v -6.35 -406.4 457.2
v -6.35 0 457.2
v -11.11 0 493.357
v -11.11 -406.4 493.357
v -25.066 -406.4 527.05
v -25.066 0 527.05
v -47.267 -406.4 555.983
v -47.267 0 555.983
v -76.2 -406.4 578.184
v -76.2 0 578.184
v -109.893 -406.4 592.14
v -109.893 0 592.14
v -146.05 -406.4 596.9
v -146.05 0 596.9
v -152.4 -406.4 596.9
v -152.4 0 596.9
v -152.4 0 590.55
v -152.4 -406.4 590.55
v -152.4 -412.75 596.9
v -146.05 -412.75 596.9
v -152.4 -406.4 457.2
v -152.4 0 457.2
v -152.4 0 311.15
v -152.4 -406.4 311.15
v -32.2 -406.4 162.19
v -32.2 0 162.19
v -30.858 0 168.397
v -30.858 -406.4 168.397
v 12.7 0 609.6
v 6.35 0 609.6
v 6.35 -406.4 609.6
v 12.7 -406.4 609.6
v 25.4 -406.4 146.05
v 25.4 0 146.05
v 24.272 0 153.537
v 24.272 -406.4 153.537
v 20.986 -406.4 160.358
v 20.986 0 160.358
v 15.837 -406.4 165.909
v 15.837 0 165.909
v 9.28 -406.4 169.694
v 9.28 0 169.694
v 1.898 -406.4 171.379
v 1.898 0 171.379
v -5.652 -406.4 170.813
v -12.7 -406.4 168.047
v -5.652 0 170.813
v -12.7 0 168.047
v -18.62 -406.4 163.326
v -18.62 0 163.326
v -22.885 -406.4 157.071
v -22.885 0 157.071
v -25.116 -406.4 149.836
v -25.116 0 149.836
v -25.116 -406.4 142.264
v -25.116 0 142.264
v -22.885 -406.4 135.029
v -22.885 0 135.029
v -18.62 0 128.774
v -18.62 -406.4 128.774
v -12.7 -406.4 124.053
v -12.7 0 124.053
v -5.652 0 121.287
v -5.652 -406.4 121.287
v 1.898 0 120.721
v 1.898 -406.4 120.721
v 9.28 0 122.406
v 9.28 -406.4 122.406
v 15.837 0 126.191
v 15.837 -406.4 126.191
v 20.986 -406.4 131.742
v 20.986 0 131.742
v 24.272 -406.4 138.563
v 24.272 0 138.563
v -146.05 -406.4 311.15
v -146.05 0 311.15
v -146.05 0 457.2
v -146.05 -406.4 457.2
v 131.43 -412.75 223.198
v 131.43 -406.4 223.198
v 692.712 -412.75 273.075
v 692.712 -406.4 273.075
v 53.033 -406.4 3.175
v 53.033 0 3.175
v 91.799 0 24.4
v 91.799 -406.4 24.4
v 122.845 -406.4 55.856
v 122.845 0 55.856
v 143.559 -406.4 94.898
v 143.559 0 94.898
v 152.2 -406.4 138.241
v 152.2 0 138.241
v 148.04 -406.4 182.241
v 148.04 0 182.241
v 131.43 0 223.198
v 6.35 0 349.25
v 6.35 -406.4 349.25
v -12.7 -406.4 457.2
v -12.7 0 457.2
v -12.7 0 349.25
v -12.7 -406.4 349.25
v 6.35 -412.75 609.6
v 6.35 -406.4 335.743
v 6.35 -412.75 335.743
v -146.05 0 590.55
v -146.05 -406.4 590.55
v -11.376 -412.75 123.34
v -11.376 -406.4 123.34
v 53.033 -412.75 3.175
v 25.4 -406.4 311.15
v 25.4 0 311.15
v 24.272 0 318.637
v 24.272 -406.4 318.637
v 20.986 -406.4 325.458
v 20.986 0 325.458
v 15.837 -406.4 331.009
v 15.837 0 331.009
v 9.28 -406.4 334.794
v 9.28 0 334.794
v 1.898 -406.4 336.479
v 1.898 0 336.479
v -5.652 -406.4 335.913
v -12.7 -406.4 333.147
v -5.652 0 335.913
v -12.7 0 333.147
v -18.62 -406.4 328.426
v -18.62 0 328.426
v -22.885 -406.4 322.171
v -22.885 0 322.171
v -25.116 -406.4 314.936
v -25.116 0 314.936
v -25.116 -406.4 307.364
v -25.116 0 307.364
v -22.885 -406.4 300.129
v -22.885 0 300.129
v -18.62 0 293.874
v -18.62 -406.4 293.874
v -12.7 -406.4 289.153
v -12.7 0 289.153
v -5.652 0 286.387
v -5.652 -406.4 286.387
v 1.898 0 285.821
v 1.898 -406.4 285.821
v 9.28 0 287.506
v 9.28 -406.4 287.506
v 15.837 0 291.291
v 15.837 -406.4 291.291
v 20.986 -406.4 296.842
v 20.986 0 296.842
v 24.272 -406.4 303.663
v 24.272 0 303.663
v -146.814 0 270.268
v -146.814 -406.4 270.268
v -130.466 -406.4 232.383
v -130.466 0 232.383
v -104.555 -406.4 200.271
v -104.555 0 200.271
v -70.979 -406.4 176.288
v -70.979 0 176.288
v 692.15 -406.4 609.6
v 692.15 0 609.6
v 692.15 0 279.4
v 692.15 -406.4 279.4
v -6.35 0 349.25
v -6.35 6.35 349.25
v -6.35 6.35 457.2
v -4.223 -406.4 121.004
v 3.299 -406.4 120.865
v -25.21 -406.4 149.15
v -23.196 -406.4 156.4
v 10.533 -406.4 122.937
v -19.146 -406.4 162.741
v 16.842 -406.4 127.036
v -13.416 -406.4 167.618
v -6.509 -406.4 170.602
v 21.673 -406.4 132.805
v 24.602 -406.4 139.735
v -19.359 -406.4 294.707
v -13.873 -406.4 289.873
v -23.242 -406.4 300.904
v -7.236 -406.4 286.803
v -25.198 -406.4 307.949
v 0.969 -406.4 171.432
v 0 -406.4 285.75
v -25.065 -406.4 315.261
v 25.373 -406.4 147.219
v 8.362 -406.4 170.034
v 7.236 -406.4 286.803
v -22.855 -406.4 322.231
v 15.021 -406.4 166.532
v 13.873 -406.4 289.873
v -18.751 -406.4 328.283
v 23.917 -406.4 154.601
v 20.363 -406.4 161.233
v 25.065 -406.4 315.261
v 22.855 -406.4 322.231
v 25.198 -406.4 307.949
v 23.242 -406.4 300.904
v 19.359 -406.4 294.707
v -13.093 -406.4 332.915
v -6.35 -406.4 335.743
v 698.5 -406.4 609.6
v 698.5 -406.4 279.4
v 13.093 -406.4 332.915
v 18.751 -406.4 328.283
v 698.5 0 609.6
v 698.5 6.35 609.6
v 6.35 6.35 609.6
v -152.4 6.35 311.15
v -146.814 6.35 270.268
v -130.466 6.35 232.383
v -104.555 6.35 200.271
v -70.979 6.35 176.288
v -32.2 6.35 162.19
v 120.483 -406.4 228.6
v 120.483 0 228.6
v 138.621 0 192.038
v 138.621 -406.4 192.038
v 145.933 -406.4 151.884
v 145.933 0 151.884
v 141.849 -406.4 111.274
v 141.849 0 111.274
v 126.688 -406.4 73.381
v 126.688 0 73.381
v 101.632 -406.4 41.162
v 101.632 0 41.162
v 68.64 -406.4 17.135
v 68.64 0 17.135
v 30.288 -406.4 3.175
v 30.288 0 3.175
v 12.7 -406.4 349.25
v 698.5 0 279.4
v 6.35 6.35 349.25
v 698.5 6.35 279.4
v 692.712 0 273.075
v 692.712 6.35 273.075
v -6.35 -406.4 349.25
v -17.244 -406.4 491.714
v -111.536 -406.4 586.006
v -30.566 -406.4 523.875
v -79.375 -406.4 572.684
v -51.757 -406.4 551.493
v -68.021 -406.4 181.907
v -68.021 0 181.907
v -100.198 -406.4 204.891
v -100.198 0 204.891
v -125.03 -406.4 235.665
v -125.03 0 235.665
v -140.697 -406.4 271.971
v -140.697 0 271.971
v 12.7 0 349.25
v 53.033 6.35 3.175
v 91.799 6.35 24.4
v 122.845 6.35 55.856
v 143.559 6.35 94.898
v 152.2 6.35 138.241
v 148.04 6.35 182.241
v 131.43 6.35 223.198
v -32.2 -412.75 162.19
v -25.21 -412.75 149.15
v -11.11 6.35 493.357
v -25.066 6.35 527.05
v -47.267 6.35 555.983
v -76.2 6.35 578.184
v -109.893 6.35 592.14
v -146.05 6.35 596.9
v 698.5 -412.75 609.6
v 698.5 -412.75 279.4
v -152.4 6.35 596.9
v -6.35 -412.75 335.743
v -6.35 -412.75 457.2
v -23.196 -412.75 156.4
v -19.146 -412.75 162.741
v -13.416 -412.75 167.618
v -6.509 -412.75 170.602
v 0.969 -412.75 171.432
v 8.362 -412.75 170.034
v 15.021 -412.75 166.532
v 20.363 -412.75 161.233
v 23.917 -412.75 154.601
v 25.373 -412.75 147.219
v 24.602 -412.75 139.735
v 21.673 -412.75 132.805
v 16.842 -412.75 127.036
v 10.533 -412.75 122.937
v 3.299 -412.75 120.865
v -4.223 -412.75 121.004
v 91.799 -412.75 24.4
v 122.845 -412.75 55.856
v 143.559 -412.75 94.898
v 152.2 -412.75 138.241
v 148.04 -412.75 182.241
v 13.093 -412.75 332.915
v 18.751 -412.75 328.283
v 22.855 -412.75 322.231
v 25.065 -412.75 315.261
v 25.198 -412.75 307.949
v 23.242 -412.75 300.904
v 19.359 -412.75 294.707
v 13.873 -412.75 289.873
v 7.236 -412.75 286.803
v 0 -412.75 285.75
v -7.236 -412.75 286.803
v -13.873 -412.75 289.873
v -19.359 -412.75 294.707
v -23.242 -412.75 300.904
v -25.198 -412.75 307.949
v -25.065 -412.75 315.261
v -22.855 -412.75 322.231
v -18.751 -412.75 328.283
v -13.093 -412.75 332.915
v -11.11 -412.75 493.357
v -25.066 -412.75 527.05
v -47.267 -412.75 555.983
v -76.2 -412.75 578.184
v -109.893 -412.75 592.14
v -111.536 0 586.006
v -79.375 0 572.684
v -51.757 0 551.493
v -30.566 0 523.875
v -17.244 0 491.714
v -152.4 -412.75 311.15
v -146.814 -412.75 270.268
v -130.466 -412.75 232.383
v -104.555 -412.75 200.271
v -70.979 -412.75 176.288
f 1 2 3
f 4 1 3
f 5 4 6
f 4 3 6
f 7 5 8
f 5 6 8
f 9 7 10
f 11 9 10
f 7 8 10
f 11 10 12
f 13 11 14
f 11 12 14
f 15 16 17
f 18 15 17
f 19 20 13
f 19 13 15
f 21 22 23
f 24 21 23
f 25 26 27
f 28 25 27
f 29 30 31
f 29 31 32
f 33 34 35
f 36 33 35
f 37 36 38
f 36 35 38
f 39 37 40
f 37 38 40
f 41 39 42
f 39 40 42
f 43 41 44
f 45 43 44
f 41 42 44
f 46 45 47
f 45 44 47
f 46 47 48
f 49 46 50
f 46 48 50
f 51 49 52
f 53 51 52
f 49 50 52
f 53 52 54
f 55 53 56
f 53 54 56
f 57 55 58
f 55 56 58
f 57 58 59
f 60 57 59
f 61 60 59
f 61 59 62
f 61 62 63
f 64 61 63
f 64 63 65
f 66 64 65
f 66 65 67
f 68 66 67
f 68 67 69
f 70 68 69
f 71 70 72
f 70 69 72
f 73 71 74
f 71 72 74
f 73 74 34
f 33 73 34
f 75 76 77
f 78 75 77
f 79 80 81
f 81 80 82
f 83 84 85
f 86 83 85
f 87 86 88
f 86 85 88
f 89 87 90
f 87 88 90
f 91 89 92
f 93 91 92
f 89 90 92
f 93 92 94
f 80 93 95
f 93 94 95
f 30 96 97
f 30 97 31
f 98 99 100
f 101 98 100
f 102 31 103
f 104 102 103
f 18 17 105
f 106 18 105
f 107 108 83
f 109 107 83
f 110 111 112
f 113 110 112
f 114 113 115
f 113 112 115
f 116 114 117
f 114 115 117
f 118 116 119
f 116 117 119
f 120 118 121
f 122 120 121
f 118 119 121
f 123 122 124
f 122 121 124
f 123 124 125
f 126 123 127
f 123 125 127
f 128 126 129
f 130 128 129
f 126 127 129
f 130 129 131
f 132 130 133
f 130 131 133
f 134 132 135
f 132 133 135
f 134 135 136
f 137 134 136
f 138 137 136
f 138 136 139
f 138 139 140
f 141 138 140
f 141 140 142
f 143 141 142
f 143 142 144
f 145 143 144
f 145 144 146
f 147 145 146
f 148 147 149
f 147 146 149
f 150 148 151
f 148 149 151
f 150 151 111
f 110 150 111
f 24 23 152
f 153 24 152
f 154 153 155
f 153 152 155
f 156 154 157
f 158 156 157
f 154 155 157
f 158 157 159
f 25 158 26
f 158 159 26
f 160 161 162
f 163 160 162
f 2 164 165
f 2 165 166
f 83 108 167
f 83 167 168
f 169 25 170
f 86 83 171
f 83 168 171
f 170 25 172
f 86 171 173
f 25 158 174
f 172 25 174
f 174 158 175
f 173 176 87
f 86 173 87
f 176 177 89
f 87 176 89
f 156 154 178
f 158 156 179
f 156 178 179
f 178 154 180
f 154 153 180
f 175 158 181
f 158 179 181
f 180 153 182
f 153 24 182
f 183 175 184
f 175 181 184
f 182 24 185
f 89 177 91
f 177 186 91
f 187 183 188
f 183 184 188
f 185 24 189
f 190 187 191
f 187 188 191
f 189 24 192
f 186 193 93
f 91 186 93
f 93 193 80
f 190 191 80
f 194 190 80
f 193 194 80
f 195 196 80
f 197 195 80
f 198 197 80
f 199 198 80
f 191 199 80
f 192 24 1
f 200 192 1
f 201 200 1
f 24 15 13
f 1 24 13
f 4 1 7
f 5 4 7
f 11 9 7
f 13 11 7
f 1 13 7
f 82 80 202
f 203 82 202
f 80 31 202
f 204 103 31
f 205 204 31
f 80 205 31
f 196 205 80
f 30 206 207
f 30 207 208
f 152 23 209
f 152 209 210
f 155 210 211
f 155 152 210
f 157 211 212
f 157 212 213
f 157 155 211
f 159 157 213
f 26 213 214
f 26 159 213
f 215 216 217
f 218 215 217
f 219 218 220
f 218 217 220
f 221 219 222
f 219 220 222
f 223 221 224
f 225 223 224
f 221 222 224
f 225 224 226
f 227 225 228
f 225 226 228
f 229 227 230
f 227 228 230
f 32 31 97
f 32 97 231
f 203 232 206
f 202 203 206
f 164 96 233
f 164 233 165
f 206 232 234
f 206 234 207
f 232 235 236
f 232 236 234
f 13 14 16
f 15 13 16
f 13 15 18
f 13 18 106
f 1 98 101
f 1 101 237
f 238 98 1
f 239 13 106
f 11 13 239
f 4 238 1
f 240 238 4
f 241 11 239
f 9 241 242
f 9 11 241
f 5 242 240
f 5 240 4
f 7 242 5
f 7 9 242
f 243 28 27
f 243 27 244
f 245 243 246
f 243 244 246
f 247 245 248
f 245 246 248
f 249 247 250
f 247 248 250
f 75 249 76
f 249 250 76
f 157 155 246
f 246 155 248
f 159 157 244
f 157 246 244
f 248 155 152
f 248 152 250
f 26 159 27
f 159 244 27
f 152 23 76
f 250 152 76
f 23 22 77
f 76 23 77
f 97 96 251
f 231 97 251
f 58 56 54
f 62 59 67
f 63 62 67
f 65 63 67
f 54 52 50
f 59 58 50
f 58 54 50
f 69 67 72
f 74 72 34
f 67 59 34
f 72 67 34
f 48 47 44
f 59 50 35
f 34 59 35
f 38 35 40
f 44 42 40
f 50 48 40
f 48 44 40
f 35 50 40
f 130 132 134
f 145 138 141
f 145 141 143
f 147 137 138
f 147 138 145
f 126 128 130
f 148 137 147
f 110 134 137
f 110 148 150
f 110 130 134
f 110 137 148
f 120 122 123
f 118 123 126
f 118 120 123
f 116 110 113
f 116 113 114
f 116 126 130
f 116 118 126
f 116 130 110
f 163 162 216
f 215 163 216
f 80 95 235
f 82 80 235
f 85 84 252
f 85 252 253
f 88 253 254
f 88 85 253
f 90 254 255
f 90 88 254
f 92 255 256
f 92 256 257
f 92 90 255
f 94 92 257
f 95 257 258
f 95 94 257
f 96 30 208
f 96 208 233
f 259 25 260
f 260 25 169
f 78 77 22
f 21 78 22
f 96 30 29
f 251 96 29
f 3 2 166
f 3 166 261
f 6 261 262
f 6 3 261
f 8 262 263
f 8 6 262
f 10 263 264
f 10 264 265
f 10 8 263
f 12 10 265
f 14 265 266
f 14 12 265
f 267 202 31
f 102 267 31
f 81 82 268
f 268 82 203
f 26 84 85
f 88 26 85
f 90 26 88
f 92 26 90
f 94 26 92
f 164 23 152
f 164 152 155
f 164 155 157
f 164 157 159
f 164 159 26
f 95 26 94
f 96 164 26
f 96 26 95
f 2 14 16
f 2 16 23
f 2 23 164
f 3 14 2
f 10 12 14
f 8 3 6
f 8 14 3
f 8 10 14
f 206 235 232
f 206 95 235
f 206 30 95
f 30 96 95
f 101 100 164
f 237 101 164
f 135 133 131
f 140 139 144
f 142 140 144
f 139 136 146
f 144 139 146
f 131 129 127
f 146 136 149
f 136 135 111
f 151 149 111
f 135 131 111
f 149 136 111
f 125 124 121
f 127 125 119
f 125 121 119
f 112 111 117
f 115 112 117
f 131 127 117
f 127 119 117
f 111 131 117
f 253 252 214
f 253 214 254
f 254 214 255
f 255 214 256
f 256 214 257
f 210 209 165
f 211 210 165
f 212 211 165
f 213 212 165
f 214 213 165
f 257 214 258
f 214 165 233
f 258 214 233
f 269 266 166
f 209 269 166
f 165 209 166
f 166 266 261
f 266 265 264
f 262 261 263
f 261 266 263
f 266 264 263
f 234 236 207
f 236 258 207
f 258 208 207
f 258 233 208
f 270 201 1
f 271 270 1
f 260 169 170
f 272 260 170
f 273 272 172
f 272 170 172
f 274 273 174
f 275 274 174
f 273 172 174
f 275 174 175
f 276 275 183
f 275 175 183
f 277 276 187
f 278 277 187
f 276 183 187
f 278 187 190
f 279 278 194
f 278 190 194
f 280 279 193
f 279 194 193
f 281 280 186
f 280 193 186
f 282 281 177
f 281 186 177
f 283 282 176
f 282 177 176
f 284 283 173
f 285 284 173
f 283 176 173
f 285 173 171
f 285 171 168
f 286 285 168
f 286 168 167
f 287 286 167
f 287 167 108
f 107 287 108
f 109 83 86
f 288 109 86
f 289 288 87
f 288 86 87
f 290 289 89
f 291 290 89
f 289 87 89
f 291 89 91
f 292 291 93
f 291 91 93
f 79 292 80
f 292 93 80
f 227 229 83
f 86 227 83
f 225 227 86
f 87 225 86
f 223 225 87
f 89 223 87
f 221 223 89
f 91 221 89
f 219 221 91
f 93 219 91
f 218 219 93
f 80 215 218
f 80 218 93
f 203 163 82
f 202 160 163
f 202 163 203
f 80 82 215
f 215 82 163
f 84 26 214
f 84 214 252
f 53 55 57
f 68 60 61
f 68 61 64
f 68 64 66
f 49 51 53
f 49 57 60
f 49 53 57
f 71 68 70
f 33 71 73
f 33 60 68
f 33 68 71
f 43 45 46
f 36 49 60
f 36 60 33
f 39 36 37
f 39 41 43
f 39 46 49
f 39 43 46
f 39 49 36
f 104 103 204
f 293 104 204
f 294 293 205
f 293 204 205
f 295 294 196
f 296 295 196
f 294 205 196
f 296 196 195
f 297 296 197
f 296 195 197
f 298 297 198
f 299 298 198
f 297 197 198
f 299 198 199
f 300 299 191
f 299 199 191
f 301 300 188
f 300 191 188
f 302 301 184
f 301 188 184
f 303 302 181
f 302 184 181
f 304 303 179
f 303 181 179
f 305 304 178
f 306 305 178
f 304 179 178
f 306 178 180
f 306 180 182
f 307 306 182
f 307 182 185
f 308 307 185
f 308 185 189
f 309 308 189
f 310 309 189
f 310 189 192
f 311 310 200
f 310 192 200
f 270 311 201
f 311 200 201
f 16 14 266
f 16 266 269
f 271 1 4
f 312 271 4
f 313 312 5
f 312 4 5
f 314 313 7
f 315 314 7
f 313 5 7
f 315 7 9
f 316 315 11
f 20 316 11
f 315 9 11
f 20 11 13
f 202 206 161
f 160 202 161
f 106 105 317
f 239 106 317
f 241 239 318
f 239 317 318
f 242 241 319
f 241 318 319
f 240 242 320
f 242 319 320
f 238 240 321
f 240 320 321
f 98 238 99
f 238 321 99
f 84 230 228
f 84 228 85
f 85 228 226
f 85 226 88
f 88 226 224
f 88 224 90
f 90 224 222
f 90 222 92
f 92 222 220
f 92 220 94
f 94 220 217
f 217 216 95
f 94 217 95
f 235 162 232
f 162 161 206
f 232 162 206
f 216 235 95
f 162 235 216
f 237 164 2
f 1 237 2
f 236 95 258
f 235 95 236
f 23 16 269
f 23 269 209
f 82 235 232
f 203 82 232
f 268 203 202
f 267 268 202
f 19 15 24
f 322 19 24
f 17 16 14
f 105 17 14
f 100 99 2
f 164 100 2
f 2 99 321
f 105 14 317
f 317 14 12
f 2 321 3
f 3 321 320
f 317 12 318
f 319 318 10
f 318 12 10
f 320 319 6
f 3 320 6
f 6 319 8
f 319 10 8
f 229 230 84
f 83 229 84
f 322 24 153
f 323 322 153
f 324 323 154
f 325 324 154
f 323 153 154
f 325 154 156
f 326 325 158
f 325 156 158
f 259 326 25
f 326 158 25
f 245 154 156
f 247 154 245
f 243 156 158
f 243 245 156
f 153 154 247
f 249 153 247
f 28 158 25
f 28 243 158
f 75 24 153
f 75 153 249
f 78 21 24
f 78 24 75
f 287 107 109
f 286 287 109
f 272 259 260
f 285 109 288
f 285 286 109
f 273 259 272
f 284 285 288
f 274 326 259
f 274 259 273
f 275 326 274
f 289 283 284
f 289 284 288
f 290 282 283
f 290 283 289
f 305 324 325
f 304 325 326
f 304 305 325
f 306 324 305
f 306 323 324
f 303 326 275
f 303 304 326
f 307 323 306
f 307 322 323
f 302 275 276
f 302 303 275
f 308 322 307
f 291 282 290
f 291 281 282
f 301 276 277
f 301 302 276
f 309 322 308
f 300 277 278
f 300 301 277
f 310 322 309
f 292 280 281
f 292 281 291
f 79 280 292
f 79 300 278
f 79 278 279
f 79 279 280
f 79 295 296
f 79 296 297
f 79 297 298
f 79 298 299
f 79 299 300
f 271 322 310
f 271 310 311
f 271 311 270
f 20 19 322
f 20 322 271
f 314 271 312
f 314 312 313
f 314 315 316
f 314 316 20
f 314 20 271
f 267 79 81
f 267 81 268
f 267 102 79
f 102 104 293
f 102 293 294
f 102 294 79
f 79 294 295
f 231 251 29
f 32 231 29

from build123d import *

# Parameters (mm, degrees)
F0_R     = 25.4
F1_DEPTH = 406.4
F0_W     = 6.35
F0_H     = 260.35
F3_DEPTH = 6.35
F5_DEPTH = 6.35


# Not quite as in the source:
# - a feature names something its author has since deleted; it is built from what else it names


with BuildPart() as f1:
    # F0 (on Front) → F1 (new body)
    with BuildSketch(Plane.XZ):
        with Locations((0, 146.05)):
            Circle(F0_R)
    extrude(amount=F1_DEPTH)


with BuildPart() as f1b:
    # F0 (on Front) → F1, piece 2 (new body)
    with BuildSketch(Plane.XZ):
        with BuildLine():
            Line((-32.1996567388, 162.1904682274), (-30.8580043747, 168.3971153846))
            ThreePointArc((-30.8580043747, 168.3971153846), (-113.6604901426, 219.4336138929), (-146.05, 311.15))
            Line((-146.05, 311.15), (-146.05, 457.2))
            Line((-146.05, 457.2), (-152.4, 457.2))
            Line((-152.4, 457.2), (-152.4, 311.15))
            ThreePointArc((-152.4, 311.15), (-118.6022505836, 215.4459449318), (-32.1996567388, 162.1904682274))
        make_face()
    extrude(amount=F1_DEPTH)


with BuildPart() as f1c:
    # F0 (on Front) → F1, piece 3 (new body)
    with BuildSketch(Plane.XZ):
        with Locations((0, 311.15)):
            Circle(F0_R)
    extrude(amount=F1_DEPTH)


with BuildPart() as f1d:
    # F0 (on Front) → F1, piece 4 (new body)
    with BuildSketch(Plane.XZ):
        with BuildLine():
            ThreePointArc((120.4827788524, 228.6), (135.5987911183, 91.7953195822), (30.287569645, 3.175))
            Line((30.287569645, 3.175), (53.032955556, 3.175))
            ThreePointArc((53.032955556, 3.175), (143.559051356, 94.8976904357), (131.430489055, 223.1978226963))
            Line((131.430489055, 223.1978226963), (692.7120644971, 273.0749242296))
            Line((692.7120644971, 273.0749242296), (698.5, 279.4))
            Line((698.5, 279.4), (698.5, 609.6))
            Line((698.5, 609.6), (692.15, 609.6))
            Line((692.15, 609.6), (692.15, 279.4))
            Line((692.15, 279.4), (120.4827788524, 228.6))
        make_face()
    extrude(amount=F1_DEPTH)


with BuildPart() as f1e:
    # F0 (on Front) → F1, piece 5 (new body)
    with BuildSketch(Plane.XZ):
        with Locations((9.525, 479.425)):
            Rectangle(F0_W, F0_H)
    extrude(amount=F1_DEPTH)


with BuildPart() as f1f:
    # F0 (on Front) → F1, piece 6 (new body)
    with BuildSketch(Plane.XZ):
        with BuildLine():
            Line((-12.7, 457.2), (-12.7, 349.25))
            Line((-12.7, 349.25), (-6.35, 349.25))
            Line((-6.35, 349.25), (-6.35, 457.2))
            ThreePointArc((-6.35, 457.2), (-47.2671826682, 555.9828173318), (-146.05, 596.9))
            Line((-146.05, 596.9), (-152.4, 596.9))
            Line((-152.4, 596.9), (-152.4, 590.55))
            Line((-152.4, 590.55), (-146.05, 590.55))
            ThreePointArc((-146.05, 590.55), (-51.7573107288, 551.4926892712), (-12.7, 457.2))
        make_face()
    extrude(amount=F1_DEPTH)


with BuildPart() as f3:
    # F2 (on Front) → F3 (new body)
    with BuildSketch(Plane.XZ):
        with BuildLine():
            Line((692.7120644971, 273.0749242296), (698.5, 279.4))
            Line((698.5, 279.4), (698.5, 609.6))
            Line((698.5, 609.6), (692.15, 609.6))
            Line((692.15, 609.6), (6.35, 609.6))
            Line((6.35, 609.6), (6.35, 349.25))
            Line((6.35, 349.25), (-6.35, 349.25))
            Line((-6.35, 349.25), (-6.35, 457.2))
            ThreePointArc((-6.35, 457.2), (-47.2671826682, 555.9828173318), (-146.05, 596.9))
            Line((-146.05, 596.9), (-152.4, 596.9))
            Line((-152.4, 596.9), (-152.4, 457.2))
            Line((-152.4, 457.2), (-152.4, 311.15))
            ThreePointArc((-152.4, 311.15), (-118.6022505836, 215.4459449318), (-32.1996567388, 162.1904682274))
            Line((-32.1996567388, 162.1904682274), (53.032955556, 3.175))
            ThreePointArc((53.032955556, 3.175), (143.559051356, 94.8976904357), (131.430489055, 223.1978226963))
            Line((131.430489055, 223.1978226963), (692.7120644971, 273.0749242296))
        make_face()
    extrude(amount=-F3_DEPTH)


with BuildPart() as f5:
    # F4 (on face) → F5 (new body)
    with BuildSketch(Plane.XZ.offset(406.4)):
        with BuildLine():
            Line((-6.35, 349.25), (-6.35, 457.2))
            ThreePointArc((-6.35, 457.2), (-47.2671826682, 555.9828173318), (-146.05, 596.9))
            Line((-146.05, 596.9), (-152.4, 596.9))
            Line((-152.4, 596.9), (-152.4, 457.2))
            Line((-152.4, 457.2), (-152.4, 311.15))
            ThreePointArc((-152.4, 311.15), (-118.6022505836, 215.4459449318), (-32.1996567388, 162.1904682274))
            Line((-32.1996567388, 162.1904682274), (-25.2100838748, 149.1502695083))
            ThreePointArc((-25.2100838748, 149.1502695083), (1.5530404984, 171.4024765104), (25.4, 146.05))
            ThreePointArc((25.4, 146.05), (13.3457878073, 124.4386615916), (-11.3755864411, 123.3397372732))
            Line((-11.3755864411, 123.3397372732), (53.032955556, 3.175))
            ThreePointArc((53.032955556, 3.175), (143.559051356, 94.8976904357), (131.430489055, 223.1978226963))
            Line((131.430489055, 223.1978226963), (692.7120644971, 273.0749242296))
            Line((692.7120644971, 273.0749242296), (698.5, 279.4))
            Line((698.5, 279.4), (698.5, 609.6))
            Line((698.5, 609.6), (6.35, 609.6))
            Line((6.35, 609.6), (6.35, 349.25))
            Line((6.35, 349.25), (6.35, 335.7434442484))
            ThreePointArc((6.35, 335.7434442484), (0, 285.75), (-6.35, 335.7434442484))
            Line((-6.35, 335.7434442484), (-6.35, 349.25))
        make_face()
    extrude(amount=F5_DEPTH)


solid = Compound([f1.part, f1b.part, f1c.part, f1d.part, f1e.part, f1f.part, f3.part, f5.part])
